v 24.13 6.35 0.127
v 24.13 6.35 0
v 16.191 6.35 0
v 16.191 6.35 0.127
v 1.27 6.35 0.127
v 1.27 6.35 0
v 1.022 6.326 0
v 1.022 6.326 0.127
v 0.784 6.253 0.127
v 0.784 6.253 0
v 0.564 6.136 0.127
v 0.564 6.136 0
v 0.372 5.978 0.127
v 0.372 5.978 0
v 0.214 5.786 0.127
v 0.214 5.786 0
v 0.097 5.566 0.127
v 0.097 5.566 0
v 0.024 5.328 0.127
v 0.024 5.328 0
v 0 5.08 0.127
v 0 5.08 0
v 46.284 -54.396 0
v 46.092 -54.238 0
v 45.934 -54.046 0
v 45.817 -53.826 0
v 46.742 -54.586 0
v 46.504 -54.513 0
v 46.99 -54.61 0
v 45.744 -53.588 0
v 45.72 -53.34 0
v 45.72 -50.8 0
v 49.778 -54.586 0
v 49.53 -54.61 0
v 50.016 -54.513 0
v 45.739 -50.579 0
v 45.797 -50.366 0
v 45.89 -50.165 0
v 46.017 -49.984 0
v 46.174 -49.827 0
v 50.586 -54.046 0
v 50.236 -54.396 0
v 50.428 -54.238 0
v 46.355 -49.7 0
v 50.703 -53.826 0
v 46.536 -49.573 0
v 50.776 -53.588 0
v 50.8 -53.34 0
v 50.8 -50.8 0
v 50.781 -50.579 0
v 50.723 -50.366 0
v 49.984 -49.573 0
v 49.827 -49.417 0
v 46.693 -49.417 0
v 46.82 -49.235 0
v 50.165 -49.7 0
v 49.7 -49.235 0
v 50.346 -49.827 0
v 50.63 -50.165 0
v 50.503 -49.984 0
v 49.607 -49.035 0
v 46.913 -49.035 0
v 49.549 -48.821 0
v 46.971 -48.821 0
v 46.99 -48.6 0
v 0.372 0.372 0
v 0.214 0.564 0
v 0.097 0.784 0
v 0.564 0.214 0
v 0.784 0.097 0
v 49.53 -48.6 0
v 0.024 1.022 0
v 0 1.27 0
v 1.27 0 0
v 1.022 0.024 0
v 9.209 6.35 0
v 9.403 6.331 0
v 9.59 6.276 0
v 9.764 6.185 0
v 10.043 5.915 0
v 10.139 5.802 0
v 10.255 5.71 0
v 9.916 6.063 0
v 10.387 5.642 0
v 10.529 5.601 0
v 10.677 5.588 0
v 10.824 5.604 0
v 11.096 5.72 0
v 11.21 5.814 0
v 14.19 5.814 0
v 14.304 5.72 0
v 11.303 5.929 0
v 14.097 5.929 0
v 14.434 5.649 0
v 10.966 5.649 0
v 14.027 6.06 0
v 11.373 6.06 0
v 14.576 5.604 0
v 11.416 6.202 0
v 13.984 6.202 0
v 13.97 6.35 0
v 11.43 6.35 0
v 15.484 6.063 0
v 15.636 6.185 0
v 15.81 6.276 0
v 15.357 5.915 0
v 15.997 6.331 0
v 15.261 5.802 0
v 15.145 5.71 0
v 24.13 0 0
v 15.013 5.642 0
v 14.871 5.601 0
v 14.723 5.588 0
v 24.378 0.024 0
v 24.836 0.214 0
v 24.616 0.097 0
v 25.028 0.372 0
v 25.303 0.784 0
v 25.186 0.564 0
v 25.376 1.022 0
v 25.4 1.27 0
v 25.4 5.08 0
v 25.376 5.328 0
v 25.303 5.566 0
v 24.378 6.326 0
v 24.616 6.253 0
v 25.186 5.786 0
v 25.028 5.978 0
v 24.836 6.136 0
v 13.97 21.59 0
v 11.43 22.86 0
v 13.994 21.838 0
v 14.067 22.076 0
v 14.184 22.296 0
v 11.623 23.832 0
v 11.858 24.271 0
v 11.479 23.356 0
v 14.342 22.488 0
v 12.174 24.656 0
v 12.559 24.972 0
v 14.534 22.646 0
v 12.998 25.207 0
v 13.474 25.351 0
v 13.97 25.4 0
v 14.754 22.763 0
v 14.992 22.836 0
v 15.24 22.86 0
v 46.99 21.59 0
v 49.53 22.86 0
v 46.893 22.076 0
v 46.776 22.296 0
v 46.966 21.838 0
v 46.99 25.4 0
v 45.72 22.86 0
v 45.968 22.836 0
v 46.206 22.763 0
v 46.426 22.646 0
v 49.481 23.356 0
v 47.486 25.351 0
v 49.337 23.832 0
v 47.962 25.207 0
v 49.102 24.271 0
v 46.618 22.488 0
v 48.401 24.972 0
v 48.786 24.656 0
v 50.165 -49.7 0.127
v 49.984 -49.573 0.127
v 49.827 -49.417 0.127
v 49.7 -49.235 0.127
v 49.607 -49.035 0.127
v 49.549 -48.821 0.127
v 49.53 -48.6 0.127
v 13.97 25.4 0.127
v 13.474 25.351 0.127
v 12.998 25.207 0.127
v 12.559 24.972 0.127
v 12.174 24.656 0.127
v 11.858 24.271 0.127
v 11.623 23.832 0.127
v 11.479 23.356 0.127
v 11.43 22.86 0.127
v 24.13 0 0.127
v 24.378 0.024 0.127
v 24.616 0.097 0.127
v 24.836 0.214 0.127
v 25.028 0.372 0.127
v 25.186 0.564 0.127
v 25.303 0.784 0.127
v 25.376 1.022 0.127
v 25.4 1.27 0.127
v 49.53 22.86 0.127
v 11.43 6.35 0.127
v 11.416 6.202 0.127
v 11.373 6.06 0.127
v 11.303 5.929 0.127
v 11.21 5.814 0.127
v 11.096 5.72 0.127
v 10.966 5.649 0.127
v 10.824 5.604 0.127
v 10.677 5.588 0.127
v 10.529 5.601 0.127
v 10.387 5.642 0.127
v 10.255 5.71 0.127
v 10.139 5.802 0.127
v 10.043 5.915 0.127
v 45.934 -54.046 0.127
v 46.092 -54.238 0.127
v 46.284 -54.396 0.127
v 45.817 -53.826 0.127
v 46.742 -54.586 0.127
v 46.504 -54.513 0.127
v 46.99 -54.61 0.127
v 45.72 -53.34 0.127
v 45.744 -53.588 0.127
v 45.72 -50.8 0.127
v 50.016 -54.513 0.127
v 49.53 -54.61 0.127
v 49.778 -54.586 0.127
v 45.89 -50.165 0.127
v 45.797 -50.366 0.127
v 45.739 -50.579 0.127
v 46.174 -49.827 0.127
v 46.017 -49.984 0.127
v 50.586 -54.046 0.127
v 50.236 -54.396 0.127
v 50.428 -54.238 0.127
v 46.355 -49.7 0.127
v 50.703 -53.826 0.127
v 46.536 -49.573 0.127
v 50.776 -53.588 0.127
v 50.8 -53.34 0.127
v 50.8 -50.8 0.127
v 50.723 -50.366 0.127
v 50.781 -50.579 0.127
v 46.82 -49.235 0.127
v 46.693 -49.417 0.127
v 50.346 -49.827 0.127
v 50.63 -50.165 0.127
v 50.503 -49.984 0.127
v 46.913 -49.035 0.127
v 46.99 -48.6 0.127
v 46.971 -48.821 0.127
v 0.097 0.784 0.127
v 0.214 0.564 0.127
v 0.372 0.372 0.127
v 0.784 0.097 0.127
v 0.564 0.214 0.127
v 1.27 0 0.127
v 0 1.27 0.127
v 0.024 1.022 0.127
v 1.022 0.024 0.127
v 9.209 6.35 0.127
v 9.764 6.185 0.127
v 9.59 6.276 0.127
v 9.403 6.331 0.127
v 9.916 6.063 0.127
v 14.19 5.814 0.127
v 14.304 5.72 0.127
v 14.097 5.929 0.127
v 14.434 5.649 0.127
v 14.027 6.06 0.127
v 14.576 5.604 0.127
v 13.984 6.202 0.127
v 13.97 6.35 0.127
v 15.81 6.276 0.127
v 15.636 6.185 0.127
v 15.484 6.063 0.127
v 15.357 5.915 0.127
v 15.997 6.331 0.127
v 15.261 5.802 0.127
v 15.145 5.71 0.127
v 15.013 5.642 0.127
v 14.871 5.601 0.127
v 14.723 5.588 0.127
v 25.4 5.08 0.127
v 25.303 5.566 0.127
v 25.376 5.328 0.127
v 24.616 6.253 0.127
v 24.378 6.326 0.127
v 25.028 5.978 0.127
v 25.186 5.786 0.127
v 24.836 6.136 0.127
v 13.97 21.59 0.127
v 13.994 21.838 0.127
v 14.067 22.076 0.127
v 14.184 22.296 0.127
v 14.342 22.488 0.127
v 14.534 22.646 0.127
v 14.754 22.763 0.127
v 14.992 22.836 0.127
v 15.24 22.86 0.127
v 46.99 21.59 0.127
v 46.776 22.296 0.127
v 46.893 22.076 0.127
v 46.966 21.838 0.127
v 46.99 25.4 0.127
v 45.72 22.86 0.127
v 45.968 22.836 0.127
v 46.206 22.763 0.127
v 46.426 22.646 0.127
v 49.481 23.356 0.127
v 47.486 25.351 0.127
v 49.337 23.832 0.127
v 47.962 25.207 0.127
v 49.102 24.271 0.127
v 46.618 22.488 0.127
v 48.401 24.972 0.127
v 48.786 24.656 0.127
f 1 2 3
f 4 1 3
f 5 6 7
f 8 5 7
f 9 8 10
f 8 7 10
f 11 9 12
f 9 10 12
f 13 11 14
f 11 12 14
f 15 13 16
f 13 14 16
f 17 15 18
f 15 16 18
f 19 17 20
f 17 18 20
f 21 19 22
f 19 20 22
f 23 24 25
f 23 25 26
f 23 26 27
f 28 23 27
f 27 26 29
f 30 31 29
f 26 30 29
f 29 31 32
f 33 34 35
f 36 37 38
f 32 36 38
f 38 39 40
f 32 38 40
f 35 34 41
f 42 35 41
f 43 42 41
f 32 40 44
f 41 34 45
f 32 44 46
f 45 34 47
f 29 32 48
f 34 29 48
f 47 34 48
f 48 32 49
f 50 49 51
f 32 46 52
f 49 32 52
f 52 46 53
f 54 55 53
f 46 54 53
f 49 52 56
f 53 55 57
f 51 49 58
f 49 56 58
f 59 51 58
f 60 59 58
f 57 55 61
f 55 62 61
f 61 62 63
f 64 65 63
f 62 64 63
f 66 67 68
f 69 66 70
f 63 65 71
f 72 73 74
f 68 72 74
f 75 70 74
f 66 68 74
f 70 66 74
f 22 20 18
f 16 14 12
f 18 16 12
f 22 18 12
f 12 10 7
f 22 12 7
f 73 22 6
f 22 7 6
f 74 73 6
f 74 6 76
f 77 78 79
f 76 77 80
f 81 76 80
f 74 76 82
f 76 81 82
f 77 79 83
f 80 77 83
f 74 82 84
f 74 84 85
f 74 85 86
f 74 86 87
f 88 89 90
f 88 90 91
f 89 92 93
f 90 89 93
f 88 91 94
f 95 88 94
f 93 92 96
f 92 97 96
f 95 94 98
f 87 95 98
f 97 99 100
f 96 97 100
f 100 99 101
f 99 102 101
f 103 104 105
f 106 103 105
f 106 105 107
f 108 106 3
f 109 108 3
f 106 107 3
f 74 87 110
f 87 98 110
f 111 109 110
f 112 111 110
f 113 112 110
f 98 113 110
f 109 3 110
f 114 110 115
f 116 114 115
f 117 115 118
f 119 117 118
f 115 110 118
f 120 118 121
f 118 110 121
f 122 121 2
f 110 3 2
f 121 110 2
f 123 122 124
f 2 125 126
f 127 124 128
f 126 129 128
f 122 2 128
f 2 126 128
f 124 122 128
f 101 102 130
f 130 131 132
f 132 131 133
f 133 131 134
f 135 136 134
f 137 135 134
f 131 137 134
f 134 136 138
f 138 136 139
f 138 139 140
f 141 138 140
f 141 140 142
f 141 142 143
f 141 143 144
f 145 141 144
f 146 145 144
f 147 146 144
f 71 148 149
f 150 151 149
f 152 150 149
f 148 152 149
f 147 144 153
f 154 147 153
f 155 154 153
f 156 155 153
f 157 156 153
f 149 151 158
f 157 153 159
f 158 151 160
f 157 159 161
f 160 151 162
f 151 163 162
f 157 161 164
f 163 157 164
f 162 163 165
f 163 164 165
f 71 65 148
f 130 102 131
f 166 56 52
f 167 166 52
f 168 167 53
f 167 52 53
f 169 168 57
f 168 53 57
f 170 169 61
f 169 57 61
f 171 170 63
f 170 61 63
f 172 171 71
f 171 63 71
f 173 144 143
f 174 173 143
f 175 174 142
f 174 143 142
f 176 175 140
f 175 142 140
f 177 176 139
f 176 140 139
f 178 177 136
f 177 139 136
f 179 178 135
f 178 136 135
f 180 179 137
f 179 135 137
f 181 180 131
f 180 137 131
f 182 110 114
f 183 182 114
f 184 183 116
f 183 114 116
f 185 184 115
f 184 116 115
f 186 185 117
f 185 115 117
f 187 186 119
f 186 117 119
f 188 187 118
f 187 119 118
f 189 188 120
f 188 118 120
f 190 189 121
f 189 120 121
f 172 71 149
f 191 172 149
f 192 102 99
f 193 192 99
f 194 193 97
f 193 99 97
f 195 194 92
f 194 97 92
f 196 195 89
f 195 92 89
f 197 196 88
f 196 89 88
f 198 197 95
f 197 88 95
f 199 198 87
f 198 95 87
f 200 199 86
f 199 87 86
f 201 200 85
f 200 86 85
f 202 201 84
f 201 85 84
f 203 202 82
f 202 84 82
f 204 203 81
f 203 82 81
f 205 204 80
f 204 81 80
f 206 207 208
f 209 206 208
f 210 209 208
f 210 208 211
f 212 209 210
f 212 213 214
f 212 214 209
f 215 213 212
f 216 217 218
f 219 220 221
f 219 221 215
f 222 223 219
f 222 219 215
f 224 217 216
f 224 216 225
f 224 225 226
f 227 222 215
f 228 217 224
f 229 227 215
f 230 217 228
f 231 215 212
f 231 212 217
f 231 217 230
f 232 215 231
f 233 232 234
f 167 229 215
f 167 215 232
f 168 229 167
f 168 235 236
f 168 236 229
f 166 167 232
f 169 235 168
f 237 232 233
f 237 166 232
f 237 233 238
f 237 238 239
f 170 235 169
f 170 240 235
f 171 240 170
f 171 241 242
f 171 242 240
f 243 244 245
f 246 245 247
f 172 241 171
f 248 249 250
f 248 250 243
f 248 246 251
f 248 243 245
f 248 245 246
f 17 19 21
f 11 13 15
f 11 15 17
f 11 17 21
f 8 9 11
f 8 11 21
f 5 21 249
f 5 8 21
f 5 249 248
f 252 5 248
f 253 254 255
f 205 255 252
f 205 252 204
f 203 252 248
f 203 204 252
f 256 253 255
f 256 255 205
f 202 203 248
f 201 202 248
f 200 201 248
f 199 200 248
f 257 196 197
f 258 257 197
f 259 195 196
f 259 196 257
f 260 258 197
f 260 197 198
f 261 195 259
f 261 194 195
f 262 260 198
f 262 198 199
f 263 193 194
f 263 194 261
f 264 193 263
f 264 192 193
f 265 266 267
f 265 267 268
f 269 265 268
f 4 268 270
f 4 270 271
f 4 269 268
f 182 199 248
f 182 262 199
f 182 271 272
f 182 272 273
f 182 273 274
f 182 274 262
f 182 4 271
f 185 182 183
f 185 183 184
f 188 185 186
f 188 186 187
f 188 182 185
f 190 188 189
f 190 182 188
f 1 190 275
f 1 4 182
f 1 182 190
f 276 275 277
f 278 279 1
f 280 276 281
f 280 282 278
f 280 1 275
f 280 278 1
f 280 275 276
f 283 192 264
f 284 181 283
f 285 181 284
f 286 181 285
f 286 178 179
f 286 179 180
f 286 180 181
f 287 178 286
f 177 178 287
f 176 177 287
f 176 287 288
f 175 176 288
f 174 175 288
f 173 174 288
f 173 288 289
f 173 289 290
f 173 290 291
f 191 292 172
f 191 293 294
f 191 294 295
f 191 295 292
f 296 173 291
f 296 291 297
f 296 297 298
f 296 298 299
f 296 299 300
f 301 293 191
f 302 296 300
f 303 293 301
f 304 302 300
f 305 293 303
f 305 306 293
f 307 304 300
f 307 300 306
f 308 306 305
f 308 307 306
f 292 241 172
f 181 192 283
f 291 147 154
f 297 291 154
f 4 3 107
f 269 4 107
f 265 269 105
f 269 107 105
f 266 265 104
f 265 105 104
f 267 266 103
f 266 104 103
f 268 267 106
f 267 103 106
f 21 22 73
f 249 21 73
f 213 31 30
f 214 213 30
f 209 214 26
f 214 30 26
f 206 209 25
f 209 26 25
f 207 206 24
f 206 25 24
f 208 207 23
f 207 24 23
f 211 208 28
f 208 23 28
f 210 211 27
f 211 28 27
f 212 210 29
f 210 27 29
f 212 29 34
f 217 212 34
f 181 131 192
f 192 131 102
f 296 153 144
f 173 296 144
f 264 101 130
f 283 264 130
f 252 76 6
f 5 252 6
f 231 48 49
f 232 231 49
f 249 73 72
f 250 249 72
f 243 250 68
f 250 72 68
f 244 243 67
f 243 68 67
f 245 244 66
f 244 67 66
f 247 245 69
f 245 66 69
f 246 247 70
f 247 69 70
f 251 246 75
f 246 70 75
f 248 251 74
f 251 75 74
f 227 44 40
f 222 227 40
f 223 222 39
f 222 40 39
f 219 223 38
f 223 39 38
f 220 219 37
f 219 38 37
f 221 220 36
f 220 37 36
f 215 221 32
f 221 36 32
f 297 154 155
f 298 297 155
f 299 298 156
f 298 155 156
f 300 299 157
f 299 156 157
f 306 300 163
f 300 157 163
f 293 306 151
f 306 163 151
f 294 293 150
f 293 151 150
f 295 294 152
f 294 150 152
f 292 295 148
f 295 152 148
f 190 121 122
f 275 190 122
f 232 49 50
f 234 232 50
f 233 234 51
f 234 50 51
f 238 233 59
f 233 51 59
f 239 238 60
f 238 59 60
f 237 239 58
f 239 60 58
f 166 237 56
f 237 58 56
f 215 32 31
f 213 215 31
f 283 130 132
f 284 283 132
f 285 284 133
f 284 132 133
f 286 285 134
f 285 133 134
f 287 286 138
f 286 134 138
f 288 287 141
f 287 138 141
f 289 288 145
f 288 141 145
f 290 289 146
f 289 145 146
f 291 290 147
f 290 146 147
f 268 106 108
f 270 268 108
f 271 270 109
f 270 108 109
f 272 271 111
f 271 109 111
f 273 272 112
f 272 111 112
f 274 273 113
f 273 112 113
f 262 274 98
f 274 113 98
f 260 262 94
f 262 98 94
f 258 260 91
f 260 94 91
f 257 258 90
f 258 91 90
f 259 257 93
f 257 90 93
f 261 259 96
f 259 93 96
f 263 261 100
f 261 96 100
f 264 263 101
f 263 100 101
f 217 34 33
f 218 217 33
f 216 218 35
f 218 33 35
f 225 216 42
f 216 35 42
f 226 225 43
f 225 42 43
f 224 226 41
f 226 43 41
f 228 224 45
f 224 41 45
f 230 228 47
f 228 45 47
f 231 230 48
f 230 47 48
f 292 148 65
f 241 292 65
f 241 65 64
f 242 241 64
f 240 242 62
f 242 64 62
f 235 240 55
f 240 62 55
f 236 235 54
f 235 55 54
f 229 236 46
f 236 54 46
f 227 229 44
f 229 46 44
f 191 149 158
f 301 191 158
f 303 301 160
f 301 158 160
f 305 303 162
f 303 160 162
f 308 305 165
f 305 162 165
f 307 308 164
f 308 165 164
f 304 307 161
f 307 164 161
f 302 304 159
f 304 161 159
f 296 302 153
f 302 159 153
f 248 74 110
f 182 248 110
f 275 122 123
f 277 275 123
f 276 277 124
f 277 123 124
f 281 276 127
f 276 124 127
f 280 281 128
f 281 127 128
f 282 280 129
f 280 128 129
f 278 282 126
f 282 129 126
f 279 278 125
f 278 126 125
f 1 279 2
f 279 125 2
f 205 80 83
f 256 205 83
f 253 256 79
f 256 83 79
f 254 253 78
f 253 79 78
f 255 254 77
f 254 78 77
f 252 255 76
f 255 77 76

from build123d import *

# Parameters (mm, degrees)
F1_DEPTH = 0.127


with BuildPart() as f1:
    # F0 (on Top) → F1 (new body)
    with BuildSketch(Plane.XY):
        with BuildLine():
            ThreePointArc((0, 1.27), (0.371974, 0.371974), (1.27, 0))
            Line((1.27, 0), (24.13, 0))
            ThreePointArc((24.13, 0), (25.028026, 0.371974), (25.4, 1.27))
            Line((25.4, 1.27), (25.4, 5.08))
            ThreePointArc((25.4, 5.08), (25.028026, 5.978026), (24.13, 6.35))
            Line((24.13, 6.35), (16.191119, 6.35))
            ThreePointArc((16.191119, 6.35), (15.720802, 6.234588), (15.357337, 5.914571))
            ThreePointArc((15.357337, 5.914571), (14.503814, 5.622968), (13.97, 6.35))
            Line((13.97, 6.35), (13.97, 21.59))
            ThreePointArc((13.97, 21.59), (14.341974, 22.488026), (15.24, 22.86))
            Line((15.24, 22.86), (45.72, 22.86))
            ThreePointArc((45.72, 22.86), (46.618026, 22.488026), (46.99, 21.59))
            Line((46.99, 21.59), (46.99, -48.600295))
            ThreePointArc((46.99, -48.600295), (46.819852, -49.235295), (46.355, -49.700148))
            ThreePointArc((46.355, -49.700148), (45.890148, -50.165), (45.72, -50.8))
            Line((45.72, -50.8), (45.72, -53.34))
            ThreePointArc((45.72, -53.34), (46.091974, -54.238026), (46.99, -54.61))
            Line((46.99, -54.61), (49.53, -54.61))
            ThreePointArc((49.53, -54.61), (50.428026, -54.238026), (50.8, -53.34))
            Line((50.8, -53.34), (50.8, -50.8))
            ThreePointArc((50.8, -50.8), (50.629852, -50.165), (50.165, -49.700148))
            ThreePointArc((50.165, -49.700148), (49.700148, -49.235295), (49.53, -48.600295))
            Line((49.53, -48.600295), (49.53, 22.86))
            ThreePointArc((49.53, 22.86), (48.786051, 24.656051), (46.99, 25.4))
            Line((46.99, 25.4), (13.97, 25.4))
            ThreePointArc((13.97, 25.4), (12.173949, 24.656051), (11.43, 22.86))
            Line((11.43, 22.86), (11.43, 6.35))
            ThreePointArc((11.43, 6.35), (10.896186, 5.622968), (10.042663, 5.914571))
            ThreePointArc((10.042663, 5.914571), (9.679198, 6.234588), (9.208881, 6.35))
            Line((9.208881, 6.35), (1.27, 6.35))
            ThreePointArc((1.27, 6.35), (0.371974, 5.978026), (0, 5.08))
            Line((0, 5.08), (0, 1.27))
        make_face()
    extrude(amount=F1_DEPTH)


solid = f1.part
